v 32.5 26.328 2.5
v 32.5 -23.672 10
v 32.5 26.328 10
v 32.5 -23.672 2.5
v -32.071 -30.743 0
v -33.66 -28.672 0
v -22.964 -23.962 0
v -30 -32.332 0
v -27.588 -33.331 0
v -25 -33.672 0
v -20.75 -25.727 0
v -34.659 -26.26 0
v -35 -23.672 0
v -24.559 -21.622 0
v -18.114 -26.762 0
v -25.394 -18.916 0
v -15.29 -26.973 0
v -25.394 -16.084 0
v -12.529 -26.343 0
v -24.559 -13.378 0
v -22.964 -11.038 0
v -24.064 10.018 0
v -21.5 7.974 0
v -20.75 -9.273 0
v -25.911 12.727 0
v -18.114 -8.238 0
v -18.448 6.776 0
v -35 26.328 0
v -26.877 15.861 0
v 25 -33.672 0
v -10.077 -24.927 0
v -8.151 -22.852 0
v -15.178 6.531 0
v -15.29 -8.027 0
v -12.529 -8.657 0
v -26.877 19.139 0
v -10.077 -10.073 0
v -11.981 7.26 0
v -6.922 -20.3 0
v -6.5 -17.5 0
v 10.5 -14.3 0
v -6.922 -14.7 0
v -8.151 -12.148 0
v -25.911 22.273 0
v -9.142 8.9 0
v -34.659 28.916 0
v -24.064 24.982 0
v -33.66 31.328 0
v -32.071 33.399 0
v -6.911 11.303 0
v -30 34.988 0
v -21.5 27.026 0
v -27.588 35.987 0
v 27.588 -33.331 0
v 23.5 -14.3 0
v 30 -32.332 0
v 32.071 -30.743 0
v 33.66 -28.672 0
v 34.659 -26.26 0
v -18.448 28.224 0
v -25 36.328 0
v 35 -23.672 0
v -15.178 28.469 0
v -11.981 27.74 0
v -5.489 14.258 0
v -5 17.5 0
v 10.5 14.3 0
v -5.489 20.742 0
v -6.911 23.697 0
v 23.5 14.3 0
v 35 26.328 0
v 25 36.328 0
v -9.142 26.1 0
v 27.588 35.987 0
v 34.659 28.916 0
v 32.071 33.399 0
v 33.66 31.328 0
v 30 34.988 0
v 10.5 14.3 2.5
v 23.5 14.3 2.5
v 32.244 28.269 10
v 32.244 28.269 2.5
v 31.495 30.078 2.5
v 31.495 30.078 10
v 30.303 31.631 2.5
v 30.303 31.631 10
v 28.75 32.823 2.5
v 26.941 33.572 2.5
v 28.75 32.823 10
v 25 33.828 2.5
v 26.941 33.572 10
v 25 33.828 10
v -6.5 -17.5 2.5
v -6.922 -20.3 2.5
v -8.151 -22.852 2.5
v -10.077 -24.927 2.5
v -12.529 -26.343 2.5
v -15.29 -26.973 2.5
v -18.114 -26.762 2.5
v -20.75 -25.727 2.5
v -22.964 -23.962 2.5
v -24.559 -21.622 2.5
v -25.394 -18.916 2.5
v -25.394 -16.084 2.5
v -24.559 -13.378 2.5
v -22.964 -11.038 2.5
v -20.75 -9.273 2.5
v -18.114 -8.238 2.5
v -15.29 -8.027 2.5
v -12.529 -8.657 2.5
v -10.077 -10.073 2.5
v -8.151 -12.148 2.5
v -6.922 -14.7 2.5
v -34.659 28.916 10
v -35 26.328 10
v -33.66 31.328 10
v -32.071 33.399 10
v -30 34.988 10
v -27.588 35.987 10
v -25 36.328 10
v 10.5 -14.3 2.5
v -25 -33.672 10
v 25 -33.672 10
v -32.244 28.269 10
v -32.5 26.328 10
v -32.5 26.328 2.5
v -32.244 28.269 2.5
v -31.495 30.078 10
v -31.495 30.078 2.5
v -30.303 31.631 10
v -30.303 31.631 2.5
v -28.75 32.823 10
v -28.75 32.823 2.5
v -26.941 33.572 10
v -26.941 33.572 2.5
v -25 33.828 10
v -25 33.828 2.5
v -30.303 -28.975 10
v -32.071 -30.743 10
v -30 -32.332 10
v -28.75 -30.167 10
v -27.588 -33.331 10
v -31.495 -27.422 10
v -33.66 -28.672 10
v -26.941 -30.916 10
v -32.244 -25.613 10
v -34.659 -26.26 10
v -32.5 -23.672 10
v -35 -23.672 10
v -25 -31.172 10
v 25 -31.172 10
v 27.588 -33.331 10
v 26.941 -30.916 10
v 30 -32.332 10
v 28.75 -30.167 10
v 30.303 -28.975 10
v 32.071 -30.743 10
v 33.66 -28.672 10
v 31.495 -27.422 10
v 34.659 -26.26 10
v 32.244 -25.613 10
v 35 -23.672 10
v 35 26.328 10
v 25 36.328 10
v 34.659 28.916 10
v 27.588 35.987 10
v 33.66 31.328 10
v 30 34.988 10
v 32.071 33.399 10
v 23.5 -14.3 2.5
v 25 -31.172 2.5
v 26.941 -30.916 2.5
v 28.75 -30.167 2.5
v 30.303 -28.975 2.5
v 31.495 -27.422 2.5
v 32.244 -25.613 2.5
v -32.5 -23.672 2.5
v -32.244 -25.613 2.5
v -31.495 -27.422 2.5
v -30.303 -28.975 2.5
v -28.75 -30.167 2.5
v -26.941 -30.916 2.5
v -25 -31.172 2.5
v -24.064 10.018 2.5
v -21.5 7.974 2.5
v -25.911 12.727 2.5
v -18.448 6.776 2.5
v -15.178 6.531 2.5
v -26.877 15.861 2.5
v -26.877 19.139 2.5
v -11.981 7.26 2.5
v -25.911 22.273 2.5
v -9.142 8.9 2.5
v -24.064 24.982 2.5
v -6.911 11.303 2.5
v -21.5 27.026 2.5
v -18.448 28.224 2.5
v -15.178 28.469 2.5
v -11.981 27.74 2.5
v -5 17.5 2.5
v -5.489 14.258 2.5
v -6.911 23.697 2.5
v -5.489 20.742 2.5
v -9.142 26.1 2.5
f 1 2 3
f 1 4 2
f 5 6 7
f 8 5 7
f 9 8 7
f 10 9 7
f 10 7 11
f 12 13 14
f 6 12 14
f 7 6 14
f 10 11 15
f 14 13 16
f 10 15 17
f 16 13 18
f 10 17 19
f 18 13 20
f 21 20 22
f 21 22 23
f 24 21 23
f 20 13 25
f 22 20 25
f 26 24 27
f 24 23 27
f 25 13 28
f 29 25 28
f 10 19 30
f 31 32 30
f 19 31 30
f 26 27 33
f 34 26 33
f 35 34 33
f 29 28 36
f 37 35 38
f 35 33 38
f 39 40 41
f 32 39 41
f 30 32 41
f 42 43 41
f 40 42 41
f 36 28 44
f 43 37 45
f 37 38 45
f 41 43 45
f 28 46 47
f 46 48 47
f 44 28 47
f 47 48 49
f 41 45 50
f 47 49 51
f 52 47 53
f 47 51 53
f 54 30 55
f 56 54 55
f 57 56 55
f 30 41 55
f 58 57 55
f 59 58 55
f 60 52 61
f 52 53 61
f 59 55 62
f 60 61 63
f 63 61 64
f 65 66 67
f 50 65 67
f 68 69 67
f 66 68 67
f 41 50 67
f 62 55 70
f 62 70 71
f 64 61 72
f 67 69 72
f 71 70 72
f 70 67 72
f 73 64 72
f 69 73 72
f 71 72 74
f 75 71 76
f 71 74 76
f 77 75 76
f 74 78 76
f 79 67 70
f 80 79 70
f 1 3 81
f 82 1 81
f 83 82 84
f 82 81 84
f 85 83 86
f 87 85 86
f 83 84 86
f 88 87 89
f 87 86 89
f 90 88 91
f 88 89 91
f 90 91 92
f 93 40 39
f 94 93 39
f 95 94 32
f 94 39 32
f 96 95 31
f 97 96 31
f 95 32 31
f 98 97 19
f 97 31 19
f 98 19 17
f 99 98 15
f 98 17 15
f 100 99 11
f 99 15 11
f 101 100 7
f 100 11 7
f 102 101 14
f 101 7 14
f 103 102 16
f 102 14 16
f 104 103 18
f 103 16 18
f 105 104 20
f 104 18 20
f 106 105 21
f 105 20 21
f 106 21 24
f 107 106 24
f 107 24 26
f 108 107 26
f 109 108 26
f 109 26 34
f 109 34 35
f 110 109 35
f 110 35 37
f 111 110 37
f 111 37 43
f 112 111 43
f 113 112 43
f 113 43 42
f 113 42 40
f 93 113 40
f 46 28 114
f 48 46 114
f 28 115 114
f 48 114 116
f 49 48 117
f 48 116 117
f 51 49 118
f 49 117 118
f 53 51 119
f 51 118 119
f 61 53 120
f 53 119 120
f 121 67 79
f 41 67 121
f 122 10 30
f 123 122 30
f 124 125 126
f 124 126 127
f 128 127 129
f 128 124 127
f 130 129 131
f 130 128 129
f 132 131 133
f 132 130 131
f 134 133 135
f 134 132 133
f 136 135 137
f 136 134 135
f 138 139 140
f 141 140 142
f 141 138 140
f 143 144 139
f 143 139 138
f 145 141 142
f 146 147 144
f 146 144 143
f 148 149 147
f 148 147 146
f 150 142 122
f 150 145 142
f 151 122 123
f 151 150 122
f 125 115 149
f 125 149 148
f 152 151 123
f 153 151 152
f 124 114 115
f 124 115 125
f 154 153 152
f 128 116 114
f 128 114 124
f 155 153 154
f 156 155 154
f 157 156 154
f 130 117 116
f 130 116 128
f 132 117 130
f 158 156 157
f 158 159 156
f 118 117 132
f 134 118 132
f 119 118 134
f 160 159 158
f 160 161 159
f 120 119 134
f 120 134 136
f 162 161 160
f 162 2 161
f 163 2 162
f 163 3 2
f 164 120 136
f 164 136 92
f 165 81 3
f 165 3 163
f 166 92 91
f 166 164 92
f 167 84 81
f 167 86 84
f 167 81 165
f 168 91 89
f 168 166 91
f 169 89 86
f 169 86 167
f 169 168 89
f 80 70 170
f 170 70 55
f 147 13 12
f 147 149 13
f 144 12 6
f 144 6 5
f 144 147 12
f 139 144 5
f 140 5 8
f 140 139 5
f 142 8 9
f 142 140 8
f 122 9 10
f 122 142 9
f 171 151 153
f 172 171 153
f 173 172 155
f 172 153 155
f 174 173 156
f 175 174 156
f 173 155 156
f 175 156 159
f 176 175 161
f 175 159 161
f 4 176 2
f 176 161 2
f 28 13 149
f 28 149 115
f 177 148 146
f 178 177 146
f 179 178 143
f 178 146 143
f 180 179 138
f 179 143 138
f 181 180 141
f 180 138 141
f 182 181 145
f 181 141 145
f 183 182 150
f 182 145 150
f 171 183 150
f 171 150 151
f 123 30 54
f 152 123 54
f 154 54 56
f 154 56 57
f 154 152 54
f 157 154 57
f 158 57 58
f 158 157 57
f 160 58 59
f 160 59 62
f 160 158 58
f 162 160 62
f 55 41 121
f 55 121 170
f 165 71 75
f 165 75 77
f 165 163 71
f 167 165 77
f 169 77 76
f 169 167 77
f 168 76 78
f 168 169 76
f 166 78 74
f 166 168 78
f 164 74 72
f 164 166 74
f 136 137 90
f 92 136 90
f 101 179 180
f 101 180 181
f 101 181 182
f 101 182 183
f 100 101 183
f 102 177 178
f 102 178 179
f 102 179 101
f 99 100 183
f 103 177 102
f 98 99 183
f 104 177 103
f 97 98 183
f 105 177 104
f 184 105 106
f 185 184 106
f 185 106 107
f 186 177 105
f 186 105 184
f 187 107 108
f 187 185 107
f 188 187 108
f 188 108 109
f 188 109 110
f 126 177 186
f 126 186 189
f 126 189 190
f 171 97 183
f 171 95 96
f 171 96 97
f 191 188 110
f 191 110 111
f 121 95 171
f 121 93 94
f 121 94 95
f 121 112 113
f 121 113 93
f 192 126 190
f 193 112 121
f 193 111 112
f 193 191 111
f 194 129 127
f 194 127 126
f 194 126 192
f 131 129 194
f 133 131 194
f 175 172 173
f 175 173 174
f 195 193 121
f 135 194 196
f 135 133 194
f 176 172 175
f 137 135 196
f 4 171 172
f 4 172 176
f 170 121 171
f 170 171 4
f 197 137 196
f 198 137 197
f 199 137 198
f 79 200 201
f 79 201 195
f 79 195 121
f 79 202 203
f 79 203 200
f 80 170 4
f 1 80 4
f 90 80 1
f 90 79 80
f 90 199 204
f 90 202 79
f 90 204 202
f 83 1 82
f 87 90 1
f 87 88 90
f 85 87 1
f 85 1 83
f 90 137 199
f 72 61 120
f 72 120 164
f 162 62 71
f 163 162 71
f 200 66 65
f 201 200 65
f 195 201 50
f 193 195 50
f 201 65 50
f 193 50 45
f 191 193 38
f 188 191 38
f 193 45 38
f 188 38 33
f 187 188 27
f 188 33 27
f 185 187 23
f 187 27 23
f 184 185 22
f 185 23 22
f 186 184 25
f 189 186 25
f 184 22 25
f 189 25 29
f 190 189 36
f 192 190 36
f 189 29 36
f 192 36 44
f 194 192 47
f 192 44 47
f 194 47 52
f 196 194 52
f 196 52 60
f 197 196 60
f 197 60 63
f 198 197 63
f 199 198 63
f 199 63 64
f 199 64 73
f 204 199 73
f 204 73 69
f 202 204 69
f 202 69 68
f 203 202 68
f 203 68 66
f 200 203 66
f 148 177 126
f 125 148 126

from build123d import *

# Parameters (mm, degrees)
F0_W     = 70
F0_H     = 70
F1_DEPTH = 10
F2_R     = 10
F3_T     = -2.5
F4_W     = 13
F4_H     = 28.6
F4_R     = 11
F4_R_2   = 9.5
F5_DEPTH = 25


with BuildPart() as f1:
    # F0 (on Top) → F1 (new body)
    with BuildSketch(Plane.XY):
        with Locations((0, 1.327967)):
            Rectangle(F0_W, F0_H)
    extrude(amount=F1_DEPTH)

    # F2
    f2_edges = [f1.edges().sort_by_distance(p)[0] for p in [
        (35, 36.327967, 5),
        (35, -33.672033, 5),
        (-35, 36.327967, 5),
        (-35, -33.672033, 5),
    ]]
    fillet(f2_edges, radius=F2_R)

    # F3
    f3_openings = [f1.faces().sort_by_distance(p)[0] for p in [
        (0, 1.327967, 10),
    ]]
    offset(amount=F3_T, openings=f3_openings)

    # F4 (on face) → F5 (cut)
    with BuildSketch(Plane(origin=(0, 0, 0), x_dir=(1, 0, 0), z_dir=(0, 0, -1))):
        with Locations((17, 0)):
            Rectangle(F4_W, F4_H)
        with Locations((-16, -17.5)):
            Circle(F4_R)
        with Locations((-16, 17.5)):
            Circle(F4_R_2)
    extrude(amount=-F5_DEPTH, mode=Mode.SUBTRACT)


solid = f1.part
